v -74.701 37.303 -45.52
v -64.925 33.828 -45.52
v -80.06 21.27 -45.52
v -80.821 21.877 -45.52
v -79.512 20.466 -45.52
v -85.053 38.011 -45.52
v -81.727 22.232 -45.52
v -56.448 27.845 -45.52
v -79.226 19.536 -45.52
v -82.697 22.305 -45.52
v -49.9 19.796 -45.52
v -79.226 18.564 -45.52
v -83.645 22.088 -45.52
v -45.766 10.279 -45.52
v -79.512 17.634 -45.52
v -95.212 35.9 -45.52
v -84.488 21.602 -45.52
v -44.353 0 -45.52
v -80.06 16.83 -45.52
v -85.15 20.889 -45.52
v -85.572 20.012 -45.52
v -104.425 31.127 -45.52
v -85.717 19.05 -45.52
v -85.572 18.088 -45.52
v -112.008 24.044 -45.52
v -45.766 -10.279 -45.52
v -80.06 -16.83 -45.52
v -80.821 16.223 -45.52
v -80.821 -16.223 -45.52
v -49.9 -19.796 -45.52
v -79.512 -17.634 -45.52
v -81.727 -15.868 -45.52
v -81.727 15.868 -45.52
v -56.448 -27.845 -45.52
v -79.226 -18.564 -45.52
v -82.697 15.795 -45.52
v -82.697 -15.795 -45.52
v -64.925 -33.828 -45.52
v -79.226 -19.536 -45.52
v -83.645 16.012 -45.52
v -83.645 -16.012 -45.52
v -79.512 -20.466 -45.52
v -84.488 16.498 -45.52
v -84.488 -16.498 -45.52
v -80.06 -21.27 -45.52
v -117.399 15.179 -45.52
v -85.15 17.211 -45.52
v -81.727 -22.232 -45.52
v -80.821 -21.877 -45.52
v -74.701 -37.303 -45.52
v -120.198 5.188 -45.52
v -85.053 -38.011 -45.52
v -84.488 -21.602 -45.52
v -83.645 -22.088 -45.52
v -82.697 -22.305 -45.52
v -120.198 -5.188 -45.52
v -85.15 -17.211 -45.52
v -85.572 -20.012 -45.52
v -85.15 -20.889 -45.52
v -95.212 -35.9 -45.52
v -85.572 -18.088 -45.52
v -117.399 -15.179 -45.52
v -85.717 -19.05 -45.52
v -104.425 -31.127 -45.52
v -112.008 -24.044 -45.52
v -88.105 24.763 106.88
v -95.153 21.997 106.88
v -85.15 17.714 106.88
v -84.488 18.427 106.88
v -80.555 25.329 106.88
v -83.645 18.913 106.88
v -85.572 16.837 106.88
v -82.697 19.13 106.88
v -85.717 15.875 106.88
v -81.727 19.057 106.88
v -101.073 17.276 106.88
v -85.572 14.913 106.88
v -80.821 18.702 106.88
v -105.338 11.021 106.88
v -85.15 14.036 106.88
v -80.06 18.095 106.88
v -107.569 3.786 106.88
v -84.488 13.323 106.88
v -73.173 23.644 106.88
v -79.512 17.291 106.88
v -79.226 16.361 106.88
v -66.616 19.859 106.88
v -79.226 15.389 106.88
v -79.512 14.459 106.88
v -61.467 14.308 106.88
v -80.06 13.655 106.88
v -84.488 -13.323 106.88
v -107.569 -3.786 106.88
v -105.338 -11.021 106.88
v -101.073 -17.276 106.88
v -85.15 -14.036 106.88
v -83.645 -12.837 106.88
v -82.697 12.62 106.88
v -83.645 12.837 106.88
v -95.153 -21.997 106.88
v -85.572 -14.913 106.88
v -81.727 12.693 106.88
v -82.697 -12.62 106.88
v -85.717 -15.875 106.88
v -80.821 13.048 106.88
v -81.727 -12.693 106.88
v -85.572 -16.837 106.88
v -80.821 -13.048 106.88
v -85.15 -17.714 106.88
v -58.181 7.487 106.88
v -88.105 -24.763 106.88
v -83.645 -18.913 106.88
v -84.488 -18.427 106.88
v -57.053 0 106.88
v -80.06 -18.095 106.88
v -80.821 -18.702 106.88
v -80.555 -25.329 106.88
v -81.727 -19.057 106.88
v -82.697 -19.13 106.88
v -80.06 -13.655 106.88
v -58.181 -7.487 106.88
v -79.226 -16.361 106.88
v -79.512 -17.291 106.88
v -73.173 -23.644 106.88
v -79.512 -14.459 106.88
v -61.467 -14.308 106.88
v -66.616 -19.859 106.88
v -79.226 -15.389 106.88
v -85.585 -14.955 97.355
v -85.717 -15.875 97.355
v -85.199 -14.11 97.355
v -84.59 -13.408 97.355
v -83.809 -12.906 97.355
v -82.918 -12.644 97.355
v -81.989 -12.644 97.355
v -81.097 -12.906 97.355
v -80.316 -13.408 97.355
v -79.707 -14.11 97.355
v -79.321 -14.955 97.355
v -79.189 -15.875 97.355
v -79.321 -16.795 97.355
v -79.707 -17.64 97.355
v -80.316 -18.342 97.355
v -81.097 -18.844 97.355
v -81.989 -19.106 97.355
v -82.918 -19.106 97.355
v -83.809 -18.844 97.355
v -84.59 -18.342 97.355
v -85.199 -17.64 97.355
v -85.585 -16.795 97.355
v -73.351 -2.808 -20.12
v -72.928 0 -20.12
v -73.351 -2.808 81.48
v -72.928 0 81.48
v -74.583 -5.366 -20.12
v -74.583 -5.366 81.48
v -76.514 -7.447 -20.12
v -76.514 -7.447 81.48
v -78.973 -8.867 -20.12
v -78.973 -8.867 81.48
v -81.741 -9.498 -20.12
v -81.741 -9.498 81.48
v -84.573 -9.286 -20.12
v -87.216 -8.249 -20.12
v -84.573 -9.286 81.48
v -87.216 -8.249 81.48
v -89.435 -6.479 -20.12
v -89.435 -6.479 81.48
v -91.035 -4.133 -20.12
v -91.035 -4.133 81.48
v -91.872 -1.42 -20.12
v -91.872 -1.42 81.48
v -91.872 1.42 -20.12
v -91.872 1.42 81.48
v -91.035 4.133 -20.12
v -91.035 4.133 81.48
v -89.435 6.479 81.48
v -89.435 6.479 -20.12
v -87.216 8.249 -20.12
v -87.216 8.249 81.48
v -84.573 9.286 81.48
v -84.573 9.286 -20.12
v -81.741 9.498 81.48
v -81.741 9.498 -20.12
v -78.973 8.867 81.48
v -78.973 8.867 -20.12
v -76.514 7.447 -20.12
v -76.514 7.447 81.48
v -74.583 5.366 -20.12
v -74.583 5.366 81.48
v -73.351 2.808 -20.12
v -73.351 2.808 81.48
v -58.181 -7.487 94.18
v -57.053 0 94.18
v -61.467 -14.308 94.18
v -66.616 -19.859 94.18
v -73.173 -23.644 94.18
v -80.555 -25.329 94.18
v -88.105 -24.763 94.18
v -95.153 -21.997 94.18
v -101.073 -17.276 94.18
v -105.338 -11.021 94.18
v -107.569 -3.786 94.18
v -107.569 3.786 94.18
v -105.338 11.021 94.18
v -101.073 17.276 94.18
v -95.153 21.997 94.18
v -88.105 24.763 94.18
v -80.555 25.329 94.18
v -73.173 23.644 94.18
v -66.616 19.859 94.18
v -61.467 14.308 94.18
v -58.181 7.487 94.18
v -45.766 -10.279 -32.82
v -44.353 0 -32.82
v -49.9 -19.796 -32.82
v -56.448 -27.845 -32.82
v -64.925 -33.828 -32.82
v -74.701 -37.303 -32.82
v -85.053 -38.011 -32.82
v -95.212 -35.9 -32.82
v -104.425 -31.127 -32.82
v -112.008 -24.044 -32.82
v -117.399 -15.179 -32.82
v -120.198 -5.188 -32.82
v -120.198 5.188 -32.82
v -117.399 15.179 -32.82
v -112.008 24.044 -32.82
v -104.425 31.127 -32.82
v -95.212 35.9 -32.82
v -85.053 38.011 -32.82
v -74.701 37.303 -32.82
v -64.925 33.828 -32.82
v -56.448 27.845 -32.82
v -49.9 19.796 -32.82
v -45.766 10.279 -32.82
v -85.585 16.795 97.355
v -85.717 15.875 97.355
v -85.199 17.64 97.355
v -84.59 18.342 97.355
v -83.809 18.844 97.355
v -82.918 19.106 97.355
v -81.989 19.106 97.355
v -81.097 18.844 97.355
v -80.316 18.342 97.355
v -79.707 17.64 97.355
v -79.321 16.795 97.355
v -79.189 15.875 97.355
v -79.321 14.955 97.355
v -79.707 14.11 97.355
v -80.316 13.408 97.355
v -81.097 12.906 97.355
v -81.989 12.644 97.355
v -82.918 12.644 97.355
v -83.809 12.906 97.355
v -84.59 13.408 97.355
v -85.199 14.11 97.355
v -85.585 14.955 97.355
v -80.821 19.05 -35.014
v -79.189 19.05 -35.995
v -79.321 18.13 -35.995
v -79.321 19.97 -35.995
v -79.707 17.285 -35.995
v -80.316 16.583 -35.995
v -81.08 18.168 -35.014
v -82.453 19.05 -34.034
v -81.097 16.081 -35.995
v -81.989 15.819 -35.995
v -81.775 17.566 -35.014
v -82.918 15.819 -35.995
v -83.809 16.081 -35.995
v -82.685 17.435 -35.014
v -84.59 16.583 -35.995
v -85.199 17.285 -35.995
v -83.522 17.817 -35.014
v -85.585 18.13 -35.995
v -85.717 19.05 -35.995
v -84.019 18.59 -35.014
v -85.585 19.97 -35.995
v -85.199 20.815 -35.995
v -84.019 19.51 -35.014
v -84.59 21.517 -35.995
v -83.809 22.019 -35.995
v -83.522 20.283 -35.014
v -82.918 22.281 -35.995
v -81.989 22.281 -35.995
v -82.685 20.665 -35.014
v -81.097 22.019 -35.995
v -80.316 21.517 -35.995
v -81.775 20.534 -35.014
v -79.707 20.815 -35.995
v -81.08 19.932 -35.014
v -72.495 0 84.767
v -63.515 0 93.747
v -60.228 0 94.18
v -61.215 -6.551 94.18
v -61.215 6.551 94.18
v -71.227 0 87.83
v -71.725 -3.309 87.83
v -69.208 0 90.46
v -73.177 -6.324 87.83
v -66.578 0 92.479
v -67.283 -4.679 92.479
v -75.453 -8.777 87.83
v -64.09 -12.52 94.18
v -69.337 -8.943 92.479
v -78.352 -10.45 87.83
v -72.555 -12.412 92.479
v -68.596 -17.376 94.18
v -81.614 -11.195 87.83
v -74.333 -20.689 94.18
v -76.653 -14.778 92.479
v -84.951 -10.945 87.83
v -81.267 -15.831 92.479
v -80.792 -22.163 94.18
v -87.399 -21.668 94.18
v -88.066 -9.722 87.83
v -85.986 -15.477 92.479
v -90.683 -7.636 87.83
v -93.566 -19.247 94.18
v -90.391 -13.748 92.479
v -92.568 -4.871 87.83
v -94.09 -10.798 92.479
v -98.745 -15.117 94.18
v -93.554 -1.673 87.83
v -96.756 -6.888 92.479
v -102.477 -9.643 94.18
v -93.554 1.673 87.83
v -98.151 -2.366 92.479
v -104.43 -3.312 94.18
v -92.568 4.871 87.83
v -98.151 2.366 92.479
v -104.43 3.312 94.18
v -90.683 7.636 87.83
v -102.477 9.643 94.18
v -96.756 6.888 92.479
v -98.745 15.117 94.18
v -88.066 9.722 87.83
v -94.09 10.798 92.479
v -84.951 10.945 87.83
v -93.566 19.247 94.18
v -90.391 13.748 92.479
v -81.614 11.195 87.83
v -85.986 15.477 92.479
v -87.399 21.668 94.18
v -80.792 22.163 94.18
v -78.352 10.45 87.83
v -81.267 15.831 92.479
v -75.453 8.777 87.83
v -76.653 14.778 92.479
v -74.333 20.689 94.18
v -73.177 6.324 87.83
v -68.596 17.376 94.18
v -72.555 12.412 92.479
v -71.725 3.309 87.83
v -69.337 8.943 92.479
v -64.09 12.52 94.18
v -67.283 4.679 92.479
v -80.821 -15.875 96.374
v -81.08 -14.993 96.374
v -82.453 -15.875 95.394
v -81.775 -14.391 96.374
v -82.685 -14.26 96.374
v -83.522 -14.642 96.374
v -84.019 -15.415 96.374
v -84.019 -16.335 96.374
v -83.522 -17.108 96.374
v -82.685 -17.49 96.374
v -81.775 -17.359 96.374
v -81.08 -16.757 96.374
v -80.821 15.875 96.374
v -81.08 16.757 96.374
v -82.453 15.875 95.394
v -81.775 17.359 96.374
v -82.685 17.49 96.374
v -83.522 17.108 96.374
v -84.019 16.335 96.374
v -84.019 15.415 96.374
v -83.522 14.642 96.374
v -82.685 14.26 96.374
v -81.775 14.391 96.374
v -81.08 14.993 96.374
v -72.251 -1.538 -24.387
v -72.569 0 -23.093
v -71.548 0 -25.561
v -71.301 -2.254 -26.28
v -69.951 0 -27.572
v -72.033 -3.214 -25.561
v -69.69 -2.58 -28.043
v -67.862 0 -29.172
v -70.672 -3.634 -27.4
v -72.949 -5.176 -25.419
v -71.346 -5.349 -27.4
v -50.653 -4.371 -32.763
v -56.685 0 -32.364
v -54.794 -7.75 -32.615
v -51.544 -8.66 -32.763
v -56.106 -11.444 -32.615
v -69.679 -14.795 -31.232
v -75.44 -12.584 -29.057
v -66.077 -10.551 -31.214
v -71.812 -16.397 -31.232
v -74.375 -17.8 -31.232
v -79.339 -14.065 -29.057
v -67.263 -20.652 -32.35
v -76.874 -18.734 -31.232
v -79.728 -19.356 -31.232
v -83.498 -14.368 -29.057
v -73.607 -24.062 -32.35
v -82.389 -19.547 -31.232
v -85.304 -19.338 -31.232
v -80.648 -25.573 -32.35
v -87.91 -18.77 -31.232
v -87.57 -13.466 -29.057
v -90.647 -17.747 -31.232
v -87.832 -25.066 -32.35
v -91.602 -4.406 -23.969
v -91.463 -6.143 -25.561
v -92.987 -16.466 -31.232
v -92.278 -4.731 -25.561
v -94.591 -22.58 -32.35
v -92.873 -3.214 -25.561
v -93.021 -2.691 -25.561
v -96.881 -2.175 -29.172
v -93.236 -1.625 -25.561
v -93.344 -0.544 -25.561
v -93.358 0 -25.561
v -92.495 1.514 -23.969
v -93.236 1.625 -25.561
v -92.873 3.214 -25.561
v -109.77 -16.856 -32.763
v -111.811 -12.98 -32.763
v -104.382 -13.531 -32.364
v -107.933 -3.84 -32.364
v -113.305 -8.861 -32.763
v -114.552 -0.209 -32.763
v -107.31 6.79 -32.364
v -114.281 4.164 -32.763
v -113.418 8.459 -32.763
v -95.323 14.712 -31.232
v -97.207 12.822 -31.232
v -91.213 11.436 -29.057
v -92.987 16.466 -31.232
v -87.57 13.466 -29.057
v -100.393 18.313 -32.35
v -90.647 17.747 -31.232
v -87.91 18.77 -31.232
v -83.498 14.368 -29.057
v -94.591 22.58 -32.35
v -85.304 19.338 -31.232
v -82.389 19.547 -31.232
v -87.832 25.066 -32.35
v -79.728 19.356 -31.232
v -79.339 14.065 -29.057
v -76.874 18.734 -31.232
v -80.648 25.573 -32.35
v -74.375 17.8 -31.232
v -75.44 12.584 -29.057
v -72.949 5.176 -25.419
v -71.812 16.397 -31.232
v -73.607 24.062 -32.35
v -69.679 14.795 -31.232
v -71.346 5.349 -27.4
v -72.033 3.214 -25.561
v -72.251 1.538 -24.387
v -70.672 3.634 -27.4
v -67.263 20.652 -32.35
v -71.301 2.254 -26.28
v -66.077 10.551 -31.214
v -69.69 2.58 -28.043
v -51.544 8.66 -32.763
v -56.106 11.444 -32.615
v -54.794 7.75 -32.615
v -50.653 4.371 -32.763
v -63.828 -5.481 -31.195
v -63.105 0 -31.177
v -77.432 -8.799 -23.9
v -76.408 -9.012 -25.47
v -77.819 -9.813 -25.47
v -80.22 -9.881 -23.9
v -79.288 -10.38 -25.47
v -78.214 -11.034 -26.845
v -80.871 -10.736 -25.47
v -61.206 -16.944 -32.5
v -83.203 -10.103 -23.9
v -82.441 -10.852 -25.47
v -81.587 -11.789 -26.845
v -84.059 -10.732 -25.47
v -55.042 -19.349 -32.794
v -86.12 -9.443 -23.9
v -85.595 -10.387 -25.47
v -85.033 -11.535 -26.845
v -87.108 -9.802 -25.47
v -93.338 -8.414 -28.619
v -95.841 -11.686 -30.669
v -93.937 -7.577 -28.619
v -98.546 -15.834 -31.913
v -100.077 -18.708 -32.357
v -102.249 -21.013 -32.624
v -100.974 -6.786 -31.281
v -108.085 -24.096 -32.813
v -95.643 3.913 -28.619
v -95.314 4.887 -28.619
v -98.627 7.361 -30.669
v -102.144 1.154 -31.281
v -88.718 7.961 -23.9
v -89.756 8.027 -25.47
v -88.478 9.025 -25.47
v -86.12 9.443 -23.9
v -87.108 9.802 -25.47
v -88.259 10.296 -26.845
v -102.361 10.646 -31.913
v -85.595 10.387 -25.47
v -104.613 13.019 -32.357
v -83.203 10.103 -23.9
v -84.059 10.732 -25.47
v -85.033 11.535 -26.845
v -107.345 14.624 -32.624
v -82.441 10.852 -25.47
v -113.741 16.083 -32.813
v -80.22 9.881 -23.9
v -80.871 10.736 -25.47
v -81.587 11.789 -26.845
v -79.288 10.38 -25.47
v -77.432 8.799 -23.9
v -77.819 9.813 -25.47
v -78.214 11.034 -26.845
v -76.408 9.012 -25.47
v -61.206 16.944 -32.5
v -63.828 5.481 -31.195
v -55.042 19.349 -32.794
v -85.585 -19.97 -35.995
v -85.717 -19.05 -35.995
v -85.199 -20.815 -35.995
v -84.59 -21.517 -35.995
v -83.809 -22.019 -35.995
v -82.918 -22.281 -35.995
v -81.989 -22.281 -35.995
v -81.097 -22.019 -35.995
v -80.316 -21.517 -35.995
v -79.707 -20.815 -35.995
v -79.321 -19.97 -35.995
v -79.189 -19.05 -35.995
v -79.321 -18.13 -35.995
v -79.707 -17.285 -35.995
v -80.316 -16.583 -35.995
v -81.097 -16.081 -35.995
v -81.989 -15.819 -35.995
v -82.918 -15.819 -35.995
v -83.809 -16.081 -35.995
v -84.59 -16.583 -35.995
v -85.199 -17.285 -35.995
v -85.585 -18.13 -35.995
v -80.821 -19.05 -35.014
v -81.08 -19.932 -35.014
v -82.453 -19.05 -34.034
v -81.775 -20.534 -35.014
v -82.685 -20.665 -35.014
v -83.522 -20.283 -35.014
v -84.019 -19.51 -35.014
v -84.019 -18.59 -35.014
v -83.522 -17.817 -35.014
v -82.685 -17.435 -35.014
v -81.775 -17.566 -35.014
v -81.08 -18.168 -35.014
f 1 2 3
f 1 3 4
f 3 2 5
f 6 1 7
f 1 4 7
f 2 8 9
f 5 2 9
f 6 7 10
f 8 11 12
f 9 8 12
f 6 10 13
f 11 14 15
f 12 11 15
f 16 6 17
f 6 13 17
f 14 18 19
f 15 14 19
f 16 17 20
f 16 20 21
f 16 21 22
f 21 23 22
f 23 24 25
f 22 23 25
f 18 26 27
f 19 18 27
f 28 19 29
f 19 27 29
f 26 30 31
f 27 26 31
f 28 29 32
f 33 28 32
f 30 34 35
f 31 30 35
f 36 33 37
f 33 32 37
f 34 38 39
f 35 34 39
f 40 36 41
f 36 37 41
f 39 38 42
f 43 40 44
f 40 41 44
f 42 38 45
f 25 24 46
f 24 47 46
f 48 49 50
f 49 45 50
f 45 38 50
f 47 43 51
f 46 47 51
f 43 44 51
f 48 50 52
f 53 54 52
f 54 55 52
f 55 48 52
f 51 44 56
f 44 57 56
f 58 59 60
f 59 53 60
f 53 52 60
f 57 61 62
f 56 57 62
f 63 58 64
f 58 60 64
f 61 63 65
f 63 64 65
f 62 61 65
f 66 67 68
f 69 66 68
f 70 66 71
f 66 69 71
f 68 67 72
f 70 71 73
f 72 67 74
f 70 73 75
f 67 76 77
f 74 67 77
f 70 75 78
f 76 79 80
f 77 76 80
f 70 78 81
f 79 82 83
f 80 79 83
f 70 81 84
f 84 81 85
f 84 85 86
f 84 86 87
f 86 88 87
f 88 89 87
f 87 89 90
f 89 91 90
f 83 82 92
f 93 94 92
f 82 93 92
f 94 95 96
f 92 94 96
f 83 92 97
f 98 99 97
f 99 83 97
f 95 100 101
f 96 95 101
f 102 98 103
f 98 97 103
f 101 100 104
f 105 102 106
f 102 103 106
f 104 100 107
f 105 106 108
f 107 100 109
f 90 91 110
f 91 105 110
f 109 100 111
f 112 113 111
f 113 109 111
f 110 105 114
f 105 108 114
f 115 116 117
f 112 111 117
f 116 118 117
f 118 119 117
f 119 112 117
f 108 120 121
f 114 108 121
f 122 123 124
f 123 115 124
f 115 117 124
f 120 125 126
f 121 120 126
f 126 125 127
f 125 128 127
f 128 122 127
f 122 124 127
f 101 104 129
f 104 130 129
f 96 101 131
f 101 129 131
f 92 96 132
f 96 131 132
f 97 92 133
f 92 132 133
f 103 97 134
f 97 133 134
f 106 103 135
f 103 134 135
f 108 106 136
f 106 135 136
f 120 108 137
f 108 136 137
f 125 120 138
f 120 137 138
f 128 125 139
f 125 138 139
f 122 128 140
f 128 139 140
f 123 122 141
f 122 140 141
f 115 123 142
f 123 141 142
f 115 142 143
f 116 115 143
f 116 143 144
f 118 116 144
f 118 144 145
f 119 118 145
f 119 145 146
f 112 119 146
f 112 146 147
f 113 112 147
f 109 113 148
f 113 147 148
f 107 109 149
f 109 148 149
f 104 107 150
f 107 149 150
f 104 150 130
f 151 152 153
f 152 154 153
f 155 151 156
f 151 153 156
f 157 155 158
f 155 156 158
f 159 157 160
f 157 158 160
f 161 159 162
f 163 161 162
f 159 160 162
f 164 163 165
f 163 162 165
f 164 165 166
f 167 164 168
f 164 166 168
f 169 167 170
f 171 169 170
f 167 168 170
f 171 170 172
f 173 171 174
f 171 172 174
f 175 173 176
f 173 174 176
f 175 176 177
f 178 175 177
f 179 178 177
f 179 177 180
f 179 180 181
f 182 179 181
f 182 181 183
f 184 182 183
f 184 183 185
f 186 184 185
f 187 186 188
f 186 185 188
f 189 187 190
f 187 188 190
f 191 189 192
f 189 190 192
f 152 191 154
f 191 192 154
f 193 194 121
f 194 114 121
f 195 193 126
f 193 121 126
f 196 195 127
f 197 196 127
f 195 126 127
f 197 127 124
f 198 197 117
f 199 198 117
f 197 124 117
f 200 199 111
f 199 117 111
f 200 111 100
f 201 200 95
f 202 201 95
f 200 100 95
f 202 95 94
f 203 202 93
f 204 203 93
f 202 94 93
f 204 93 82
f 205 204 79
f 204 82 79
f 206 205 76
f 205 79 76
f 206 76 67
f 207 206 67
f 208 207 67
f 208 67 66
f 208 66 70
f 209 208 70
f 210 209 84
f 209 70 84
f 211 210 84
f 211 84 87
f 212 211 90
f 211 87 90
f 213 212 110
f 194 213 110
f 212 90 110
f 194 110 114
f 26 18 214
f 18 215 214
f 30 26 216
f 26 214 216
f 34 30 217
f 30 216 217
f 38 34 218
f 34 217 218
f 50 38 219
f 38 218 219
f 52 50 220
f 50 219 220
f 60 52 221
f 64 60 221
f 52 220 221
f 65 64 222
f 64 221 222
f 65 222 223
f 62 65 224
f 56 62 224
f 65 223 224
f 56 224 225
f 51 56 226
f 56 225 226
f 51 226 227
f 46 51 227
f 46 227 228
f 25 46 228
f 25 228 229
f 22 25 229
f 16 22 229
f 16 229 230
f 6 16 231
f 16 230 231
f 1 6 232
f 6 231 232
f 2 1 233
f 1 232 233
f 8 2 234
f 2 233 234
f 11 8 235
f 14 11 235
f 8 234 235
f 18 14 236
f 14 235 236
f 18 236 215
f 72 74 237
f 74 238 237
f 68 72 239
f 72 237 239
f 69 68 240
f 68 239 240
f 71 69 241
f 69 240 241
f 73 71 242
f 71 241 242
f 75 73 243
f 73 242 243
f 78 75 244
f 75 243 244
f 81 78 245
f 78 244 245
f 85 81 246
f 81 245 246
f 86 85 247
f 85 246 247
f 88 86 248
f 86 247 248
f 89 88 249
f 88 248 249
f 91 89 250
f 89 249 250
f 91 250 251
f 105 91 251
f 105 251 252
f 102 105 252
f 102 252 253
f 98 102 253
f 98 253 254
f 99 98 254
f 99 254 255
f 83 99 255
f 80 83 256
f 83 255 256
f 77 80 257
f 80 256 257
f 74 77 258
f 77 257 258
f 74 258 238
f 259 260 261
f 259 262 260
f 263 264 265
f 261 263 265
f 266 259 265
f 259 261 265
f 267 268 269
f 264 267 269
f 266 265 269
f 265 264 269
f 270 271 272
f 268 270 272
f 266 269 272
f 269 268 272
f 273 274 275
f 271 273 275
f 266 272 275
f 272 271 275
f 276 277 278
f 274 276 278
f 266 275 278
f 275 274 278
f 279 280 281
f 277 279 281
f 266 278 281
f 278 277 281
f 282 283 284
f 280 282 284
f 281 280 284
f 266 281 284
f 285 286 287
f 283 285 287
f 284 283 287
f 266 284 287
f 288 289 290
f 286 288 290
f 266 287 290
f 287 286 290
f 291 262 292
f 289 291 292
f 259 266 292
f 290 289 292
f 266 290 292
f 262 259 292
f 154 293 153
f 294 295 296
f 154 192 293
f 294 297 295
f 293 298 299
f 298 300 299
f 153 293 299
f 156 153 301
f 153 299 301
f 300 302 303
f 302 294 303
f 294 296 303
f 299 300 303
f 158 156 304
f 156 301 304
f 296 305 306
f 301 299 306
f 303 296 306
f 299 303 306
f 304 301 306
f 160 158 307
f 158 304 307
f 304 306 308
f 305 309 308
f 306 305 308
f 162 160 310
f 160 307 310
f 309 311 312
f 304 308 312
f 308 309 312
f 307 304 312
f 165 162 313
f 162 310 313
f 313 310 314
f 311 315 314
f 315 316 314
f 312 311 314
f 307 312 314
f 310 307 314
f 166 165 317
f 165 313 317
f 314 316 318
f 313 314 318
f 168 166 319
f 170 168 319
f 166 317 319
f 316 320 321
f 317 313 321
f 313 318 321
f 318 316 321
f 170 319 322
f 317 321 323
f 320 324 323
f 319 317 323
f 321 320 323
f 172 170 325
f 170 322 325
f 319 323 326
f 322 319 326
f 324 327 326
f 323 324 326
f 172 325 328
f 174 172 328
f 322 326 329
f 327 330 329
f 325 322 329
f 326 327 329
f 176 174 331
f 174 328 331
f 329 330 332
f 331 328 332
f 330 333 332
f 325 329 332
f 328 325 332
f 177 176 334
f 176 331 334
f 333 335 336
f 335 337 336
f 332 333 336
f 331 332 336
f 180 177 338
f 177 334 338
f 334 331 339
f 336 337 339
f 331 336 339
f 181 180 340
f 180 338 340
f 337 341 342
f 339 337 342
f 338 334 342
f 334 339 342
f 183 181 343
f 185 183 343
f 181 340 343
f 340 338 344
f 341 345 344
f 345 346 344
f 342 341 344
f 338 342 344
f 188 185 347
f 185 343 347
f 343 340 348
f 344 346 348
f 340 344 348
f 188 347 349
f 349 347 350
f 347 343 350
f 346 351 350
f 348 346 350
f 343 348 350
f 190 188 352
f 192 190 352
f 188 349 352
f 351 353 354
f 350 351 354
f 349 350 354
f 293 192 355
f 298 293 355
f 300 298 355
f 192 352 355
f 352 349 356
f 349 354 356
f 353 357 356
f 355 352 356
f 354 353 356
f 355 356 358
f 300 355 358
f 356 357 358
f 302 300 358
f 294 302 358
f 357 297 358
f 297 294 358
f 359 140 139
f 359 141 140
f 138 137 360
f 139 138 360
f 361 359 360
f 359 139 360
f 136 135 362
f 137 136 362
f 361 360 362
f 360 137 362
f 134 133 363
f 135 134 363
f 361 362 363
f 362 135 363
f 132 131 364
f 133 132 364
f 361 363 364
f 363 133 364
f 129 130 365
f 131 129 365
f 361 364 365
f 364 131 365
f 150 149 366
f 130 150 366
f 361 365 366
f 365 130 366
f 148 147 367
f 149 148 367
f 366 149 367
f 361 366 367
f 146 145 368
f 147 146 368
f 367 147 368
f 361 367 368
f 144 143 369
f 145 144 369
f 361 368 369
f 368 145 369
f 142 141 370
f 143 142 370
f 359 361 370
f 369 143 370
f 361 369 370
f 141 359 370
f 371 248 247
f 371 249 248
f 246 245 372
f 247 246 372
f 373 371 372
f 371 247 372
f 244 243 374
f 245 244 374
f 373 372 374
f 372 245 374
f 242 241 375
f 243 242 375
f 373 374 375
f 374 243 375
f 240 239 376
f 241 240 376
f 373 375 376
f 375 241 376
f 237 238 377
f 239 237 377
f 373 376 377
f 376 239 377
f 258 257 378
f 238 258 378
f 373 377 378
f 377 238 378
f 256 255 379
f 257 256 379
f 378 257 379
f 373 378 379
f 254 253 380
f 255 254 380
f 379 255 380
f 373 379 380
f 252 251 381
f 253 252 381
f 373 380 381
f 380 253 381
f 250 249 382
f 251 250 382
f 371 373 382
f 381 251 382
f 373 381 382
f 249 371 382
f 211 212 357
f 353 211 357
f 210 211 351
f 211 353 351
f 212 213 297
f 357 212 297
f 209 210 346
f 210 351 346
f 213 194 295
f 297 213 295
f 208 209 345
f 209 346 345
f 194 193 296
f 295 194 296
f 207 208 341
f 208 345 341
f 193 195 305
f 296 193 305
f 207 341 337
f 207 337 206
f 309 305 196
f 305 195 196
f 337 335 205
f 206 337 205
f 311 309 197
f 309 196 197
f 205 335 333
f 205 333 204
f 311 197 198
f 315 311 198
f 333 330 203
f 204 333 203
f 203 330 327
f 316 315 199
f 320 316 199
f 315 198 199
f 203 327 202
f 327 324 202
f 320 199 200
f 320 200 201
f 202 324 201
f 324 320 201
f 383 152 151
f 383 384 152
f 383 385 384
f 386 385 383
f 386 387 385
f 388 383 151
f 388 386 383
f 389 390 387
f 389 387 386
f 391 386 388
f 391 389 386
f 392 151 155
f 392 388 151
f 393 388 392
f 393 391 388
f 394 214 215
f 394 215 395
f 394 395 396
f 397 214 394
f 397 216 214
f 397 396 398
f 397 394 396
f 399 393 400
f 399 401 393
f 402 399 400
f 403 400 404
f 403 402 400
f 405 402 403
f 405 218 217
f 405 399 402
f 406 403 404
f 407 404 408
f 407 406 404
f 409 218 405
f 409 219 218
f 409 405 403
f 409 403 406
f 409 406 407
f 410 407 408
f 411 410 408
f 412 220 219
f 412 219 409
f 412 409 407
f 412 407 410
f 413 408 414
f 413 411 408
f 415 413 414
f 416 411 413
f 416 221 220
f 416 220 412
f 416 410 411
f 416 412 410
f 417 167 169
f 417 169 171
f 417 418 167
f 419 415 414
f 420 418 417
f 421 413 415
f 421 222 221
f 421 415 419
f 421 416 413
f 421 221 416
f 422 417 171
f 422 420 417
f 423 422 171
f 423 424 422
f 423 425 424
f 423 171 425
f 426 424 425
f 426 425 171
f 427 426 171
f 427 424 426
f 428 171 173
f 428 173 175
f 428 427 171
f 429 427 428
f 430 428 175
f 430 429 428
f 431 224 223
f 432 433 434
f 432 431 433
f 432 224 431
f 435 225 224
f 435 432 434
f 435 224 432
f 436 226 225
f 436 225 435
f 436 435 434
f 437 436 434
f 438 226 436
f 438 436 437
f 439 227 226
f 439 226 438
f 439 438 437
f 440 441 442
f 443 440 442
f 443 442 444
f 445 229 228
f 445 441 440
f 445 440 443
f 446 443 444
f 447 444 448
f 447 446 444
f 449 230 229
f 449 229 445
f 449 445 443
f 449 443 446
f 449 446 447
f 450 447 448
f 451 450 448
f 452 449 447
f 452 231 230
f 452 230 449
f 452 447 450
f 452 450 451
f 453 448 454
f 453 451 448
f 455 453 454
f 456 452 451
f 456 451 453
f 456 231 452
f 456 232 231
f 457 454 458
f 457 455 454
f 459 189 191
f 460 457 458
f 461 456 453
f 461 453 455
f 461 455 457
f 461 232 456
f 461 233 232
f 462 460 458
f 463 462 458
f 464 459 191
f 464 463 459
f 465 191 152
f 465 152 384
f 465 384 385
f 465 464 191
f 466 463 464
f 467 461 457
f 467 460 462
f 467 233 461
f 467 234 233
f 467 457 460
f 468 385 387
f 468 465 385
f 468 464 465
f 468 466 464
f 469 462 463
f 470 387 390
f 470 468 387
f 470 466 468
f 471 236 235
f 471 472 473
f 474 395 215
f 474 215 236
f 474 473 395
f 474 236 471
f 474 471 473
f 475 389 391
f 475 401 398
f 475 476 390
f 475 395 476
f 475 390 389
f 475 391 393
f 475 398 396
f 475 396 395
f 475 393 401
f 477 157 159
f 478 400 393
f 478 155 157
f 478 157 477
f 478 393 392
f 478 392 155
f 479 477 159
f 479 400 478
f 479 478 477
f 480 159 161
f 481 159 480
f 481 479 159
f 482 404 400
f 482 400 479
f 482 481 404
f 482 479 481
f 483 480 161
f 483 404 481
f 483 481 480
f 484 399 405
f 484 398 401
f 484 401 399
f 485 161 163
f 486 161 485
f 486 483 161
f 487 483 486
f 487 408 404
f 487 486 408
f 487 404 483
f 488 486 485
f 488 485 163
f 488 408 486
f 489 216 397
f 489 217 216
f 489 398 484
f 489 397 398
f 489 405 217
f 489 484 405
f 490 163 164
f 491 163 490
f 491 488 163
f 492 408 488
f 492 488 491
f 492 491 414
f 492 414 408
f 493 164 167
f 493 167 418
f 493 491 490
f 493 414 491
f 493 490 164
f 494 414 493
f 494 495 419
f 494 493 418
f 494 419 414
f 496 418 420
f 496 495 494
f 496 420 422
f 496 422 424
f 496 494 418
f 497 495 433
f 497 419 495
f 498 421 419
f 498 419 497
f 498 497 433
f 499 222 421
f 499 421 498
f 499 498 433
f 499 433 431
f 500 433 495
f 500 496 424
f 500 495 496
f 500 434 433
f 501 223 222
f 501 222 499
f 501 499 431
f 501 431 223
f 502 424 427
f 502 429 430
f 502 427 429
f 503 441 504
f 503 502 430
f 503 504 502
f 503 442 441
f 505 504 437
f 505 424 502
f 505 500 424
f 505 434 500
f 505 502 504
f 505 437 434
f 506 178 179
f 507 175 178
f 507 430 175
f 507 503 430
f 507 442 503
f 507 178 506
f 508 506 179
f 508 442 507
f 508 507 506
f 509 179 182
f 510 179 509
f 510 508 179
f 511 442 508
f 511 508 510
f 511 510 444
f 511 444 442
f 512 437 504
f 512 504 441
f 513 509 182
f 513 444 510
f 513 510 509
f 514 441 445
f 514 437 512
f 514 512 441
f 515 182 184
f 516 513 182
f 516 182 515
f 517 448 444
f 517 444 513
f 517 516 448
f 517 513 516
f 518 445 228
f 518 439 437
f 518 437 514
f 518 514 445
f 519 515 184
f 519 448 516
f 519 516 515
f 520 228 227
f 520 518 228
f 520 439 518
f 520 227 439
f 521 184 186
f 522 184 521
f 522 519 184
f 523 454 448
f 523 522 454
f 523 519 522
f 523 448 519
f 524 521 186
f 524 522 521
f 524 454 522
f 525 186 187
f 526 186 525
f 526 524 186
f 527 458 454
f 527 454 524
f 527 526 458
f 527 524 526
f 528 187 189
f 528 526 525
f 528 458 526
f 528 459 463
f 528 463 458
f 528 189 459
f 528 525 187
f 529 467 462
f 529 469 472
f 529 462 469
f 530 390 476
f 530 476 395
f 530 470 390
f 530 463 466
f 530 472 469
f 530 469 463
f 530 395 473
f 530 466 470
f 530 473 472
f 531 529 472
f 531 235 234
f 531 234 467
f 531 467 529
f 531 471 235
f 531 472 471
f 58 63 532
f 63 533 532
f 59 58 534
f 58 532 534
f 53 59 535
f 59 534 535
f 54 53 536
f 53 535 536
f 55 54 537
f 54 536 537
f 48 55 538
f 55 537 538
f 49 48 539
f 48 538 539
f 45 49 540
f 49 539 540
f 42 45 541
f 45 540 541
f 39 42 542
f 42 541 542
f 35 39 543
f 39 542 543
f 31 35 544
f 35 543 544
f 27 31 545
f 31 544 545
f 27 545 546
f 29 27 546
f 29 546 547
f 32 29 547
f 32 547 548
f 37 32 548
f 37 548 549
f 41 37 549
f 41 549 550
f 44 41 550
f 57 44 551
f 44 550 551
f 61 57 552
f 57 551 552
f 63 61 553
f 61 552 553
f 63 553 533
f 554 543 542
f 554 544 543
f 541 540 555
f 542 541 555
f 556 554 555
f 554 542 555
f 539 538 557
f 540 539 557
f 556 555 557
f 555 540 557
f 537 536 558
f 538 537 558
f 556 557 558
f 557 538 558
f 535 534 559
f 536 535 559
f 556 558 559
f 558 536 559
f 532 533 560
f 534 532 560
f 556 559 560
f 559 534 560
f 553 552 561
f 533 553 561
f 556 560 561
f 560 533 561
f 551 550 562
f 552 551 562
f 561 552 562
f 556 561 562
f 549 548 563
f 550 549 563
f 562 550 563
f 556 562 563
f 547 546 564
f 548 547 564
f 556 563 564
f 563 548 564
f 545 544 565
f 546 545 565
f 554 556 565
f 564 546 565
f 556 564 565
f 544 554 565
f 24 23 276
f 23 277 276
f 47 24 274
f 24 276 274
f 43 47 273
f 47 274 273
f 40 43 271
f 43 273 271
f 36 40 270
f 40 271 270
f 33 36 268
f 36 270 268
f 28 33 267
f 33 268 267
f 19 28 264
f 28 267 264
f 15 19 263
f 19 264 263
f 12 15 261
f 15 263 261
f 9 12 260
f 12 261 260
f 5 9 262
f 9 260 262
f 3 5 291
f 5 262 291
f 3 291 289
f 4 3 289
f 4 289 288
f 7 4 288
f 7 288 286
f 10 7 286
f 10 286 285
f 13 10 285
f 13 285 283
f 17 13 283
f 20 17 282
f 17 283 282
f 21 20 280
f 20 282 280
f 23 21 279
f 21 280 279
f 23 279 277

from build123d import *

# Parameters (mm, degrees)
F3_D     = 6.5278
F3_DEPTH = 9.525
F3_TIP   = 1.9611489744
F5_D     = 6.5278
F5_DEPTH = 9.525
F5_TIP   = 1.9611489744


with BuildPart() as f1:
    # F0 (on Front) → F1 (revolve)
    with BuildSketch(Plane.XZ):
        with BuildLine():
            Line((-57.0530471623, 106.8800194085), (-82.4530471623, 106.8800194085))
            Line((-82.4530471623, 106.8800194085), (-82.4530471623, -45.5199805915))
            Line((-82.4530471623, -45.5199805915), (-44.3530471623, -45.5199805915))
            Line((-44.3530471623, -45.5199805915), (-44.3530471623, -32.8199805915))
            add(Edge.make_bspline(
                [(-72.9280471623, -20.1199805915), (-72.9280471623, -32.8199805915), (-55.7276420295, -32.8199805915), (-44.3530471623, -32.8199805915)],
                knots=[0, 0, 0, 0, 31.2701235207, 31.2701235207, 31.2701235207, 31.2701235207], degree=3))
            Line((-72.9280471623, -20.1199805915), (-72.9280471623, 81.4800194085))
            ThreePointArc((-72.9280471623, 81.4800194085), (-69.2083032834, 90.4602755295), (-60.2280471623, 94.1800194085))
            Line((-60.2280471623, 94.1800194085), (-57.0530471623, 94.1800194085))
            Line((-57.0530471623, 94.1800194085), (-57.0530471623, 106.8800194085))
        make_face()
    revolve(axis=Axis((-82.4530471623, 0, 30.6800194085), (0, 0, -1)))

    # F3
    with Locations(Plane.XY.offset(106.8800194085)):
        with Locations((-82.4530471623, 15.875), (-82.4530471623, -15.875)):
            Hole(F3_D / 2, depth=F3_DEPTH)
            with Locations((0, 0, -(F3_DEPTH + F3_TIP / 2))):  # 118° drill point
                Cone(0, F3_D / 2, F3_TIP, mode=Mode.SUBTRACT)

    # F5
    with Locations(Plane(origin=(0, 0, -45.5199805915), x_dir=(1, 0, 0), z_dir=(0, 0, -1))):
        with Locations((-82.4530471623, 19.05), (-82.4530471623, -19.05)):
            Hole(F5_D / 2, depth=F5_DEPTH)
            with Locations((0, 0, -(F5_DEPTH + F5_TIP / 2))):  # 118° drill point
                Cone(0, F5_D / 2, F5_TIP, mode=Mode.SUBTRACT)


solid = f1.part
